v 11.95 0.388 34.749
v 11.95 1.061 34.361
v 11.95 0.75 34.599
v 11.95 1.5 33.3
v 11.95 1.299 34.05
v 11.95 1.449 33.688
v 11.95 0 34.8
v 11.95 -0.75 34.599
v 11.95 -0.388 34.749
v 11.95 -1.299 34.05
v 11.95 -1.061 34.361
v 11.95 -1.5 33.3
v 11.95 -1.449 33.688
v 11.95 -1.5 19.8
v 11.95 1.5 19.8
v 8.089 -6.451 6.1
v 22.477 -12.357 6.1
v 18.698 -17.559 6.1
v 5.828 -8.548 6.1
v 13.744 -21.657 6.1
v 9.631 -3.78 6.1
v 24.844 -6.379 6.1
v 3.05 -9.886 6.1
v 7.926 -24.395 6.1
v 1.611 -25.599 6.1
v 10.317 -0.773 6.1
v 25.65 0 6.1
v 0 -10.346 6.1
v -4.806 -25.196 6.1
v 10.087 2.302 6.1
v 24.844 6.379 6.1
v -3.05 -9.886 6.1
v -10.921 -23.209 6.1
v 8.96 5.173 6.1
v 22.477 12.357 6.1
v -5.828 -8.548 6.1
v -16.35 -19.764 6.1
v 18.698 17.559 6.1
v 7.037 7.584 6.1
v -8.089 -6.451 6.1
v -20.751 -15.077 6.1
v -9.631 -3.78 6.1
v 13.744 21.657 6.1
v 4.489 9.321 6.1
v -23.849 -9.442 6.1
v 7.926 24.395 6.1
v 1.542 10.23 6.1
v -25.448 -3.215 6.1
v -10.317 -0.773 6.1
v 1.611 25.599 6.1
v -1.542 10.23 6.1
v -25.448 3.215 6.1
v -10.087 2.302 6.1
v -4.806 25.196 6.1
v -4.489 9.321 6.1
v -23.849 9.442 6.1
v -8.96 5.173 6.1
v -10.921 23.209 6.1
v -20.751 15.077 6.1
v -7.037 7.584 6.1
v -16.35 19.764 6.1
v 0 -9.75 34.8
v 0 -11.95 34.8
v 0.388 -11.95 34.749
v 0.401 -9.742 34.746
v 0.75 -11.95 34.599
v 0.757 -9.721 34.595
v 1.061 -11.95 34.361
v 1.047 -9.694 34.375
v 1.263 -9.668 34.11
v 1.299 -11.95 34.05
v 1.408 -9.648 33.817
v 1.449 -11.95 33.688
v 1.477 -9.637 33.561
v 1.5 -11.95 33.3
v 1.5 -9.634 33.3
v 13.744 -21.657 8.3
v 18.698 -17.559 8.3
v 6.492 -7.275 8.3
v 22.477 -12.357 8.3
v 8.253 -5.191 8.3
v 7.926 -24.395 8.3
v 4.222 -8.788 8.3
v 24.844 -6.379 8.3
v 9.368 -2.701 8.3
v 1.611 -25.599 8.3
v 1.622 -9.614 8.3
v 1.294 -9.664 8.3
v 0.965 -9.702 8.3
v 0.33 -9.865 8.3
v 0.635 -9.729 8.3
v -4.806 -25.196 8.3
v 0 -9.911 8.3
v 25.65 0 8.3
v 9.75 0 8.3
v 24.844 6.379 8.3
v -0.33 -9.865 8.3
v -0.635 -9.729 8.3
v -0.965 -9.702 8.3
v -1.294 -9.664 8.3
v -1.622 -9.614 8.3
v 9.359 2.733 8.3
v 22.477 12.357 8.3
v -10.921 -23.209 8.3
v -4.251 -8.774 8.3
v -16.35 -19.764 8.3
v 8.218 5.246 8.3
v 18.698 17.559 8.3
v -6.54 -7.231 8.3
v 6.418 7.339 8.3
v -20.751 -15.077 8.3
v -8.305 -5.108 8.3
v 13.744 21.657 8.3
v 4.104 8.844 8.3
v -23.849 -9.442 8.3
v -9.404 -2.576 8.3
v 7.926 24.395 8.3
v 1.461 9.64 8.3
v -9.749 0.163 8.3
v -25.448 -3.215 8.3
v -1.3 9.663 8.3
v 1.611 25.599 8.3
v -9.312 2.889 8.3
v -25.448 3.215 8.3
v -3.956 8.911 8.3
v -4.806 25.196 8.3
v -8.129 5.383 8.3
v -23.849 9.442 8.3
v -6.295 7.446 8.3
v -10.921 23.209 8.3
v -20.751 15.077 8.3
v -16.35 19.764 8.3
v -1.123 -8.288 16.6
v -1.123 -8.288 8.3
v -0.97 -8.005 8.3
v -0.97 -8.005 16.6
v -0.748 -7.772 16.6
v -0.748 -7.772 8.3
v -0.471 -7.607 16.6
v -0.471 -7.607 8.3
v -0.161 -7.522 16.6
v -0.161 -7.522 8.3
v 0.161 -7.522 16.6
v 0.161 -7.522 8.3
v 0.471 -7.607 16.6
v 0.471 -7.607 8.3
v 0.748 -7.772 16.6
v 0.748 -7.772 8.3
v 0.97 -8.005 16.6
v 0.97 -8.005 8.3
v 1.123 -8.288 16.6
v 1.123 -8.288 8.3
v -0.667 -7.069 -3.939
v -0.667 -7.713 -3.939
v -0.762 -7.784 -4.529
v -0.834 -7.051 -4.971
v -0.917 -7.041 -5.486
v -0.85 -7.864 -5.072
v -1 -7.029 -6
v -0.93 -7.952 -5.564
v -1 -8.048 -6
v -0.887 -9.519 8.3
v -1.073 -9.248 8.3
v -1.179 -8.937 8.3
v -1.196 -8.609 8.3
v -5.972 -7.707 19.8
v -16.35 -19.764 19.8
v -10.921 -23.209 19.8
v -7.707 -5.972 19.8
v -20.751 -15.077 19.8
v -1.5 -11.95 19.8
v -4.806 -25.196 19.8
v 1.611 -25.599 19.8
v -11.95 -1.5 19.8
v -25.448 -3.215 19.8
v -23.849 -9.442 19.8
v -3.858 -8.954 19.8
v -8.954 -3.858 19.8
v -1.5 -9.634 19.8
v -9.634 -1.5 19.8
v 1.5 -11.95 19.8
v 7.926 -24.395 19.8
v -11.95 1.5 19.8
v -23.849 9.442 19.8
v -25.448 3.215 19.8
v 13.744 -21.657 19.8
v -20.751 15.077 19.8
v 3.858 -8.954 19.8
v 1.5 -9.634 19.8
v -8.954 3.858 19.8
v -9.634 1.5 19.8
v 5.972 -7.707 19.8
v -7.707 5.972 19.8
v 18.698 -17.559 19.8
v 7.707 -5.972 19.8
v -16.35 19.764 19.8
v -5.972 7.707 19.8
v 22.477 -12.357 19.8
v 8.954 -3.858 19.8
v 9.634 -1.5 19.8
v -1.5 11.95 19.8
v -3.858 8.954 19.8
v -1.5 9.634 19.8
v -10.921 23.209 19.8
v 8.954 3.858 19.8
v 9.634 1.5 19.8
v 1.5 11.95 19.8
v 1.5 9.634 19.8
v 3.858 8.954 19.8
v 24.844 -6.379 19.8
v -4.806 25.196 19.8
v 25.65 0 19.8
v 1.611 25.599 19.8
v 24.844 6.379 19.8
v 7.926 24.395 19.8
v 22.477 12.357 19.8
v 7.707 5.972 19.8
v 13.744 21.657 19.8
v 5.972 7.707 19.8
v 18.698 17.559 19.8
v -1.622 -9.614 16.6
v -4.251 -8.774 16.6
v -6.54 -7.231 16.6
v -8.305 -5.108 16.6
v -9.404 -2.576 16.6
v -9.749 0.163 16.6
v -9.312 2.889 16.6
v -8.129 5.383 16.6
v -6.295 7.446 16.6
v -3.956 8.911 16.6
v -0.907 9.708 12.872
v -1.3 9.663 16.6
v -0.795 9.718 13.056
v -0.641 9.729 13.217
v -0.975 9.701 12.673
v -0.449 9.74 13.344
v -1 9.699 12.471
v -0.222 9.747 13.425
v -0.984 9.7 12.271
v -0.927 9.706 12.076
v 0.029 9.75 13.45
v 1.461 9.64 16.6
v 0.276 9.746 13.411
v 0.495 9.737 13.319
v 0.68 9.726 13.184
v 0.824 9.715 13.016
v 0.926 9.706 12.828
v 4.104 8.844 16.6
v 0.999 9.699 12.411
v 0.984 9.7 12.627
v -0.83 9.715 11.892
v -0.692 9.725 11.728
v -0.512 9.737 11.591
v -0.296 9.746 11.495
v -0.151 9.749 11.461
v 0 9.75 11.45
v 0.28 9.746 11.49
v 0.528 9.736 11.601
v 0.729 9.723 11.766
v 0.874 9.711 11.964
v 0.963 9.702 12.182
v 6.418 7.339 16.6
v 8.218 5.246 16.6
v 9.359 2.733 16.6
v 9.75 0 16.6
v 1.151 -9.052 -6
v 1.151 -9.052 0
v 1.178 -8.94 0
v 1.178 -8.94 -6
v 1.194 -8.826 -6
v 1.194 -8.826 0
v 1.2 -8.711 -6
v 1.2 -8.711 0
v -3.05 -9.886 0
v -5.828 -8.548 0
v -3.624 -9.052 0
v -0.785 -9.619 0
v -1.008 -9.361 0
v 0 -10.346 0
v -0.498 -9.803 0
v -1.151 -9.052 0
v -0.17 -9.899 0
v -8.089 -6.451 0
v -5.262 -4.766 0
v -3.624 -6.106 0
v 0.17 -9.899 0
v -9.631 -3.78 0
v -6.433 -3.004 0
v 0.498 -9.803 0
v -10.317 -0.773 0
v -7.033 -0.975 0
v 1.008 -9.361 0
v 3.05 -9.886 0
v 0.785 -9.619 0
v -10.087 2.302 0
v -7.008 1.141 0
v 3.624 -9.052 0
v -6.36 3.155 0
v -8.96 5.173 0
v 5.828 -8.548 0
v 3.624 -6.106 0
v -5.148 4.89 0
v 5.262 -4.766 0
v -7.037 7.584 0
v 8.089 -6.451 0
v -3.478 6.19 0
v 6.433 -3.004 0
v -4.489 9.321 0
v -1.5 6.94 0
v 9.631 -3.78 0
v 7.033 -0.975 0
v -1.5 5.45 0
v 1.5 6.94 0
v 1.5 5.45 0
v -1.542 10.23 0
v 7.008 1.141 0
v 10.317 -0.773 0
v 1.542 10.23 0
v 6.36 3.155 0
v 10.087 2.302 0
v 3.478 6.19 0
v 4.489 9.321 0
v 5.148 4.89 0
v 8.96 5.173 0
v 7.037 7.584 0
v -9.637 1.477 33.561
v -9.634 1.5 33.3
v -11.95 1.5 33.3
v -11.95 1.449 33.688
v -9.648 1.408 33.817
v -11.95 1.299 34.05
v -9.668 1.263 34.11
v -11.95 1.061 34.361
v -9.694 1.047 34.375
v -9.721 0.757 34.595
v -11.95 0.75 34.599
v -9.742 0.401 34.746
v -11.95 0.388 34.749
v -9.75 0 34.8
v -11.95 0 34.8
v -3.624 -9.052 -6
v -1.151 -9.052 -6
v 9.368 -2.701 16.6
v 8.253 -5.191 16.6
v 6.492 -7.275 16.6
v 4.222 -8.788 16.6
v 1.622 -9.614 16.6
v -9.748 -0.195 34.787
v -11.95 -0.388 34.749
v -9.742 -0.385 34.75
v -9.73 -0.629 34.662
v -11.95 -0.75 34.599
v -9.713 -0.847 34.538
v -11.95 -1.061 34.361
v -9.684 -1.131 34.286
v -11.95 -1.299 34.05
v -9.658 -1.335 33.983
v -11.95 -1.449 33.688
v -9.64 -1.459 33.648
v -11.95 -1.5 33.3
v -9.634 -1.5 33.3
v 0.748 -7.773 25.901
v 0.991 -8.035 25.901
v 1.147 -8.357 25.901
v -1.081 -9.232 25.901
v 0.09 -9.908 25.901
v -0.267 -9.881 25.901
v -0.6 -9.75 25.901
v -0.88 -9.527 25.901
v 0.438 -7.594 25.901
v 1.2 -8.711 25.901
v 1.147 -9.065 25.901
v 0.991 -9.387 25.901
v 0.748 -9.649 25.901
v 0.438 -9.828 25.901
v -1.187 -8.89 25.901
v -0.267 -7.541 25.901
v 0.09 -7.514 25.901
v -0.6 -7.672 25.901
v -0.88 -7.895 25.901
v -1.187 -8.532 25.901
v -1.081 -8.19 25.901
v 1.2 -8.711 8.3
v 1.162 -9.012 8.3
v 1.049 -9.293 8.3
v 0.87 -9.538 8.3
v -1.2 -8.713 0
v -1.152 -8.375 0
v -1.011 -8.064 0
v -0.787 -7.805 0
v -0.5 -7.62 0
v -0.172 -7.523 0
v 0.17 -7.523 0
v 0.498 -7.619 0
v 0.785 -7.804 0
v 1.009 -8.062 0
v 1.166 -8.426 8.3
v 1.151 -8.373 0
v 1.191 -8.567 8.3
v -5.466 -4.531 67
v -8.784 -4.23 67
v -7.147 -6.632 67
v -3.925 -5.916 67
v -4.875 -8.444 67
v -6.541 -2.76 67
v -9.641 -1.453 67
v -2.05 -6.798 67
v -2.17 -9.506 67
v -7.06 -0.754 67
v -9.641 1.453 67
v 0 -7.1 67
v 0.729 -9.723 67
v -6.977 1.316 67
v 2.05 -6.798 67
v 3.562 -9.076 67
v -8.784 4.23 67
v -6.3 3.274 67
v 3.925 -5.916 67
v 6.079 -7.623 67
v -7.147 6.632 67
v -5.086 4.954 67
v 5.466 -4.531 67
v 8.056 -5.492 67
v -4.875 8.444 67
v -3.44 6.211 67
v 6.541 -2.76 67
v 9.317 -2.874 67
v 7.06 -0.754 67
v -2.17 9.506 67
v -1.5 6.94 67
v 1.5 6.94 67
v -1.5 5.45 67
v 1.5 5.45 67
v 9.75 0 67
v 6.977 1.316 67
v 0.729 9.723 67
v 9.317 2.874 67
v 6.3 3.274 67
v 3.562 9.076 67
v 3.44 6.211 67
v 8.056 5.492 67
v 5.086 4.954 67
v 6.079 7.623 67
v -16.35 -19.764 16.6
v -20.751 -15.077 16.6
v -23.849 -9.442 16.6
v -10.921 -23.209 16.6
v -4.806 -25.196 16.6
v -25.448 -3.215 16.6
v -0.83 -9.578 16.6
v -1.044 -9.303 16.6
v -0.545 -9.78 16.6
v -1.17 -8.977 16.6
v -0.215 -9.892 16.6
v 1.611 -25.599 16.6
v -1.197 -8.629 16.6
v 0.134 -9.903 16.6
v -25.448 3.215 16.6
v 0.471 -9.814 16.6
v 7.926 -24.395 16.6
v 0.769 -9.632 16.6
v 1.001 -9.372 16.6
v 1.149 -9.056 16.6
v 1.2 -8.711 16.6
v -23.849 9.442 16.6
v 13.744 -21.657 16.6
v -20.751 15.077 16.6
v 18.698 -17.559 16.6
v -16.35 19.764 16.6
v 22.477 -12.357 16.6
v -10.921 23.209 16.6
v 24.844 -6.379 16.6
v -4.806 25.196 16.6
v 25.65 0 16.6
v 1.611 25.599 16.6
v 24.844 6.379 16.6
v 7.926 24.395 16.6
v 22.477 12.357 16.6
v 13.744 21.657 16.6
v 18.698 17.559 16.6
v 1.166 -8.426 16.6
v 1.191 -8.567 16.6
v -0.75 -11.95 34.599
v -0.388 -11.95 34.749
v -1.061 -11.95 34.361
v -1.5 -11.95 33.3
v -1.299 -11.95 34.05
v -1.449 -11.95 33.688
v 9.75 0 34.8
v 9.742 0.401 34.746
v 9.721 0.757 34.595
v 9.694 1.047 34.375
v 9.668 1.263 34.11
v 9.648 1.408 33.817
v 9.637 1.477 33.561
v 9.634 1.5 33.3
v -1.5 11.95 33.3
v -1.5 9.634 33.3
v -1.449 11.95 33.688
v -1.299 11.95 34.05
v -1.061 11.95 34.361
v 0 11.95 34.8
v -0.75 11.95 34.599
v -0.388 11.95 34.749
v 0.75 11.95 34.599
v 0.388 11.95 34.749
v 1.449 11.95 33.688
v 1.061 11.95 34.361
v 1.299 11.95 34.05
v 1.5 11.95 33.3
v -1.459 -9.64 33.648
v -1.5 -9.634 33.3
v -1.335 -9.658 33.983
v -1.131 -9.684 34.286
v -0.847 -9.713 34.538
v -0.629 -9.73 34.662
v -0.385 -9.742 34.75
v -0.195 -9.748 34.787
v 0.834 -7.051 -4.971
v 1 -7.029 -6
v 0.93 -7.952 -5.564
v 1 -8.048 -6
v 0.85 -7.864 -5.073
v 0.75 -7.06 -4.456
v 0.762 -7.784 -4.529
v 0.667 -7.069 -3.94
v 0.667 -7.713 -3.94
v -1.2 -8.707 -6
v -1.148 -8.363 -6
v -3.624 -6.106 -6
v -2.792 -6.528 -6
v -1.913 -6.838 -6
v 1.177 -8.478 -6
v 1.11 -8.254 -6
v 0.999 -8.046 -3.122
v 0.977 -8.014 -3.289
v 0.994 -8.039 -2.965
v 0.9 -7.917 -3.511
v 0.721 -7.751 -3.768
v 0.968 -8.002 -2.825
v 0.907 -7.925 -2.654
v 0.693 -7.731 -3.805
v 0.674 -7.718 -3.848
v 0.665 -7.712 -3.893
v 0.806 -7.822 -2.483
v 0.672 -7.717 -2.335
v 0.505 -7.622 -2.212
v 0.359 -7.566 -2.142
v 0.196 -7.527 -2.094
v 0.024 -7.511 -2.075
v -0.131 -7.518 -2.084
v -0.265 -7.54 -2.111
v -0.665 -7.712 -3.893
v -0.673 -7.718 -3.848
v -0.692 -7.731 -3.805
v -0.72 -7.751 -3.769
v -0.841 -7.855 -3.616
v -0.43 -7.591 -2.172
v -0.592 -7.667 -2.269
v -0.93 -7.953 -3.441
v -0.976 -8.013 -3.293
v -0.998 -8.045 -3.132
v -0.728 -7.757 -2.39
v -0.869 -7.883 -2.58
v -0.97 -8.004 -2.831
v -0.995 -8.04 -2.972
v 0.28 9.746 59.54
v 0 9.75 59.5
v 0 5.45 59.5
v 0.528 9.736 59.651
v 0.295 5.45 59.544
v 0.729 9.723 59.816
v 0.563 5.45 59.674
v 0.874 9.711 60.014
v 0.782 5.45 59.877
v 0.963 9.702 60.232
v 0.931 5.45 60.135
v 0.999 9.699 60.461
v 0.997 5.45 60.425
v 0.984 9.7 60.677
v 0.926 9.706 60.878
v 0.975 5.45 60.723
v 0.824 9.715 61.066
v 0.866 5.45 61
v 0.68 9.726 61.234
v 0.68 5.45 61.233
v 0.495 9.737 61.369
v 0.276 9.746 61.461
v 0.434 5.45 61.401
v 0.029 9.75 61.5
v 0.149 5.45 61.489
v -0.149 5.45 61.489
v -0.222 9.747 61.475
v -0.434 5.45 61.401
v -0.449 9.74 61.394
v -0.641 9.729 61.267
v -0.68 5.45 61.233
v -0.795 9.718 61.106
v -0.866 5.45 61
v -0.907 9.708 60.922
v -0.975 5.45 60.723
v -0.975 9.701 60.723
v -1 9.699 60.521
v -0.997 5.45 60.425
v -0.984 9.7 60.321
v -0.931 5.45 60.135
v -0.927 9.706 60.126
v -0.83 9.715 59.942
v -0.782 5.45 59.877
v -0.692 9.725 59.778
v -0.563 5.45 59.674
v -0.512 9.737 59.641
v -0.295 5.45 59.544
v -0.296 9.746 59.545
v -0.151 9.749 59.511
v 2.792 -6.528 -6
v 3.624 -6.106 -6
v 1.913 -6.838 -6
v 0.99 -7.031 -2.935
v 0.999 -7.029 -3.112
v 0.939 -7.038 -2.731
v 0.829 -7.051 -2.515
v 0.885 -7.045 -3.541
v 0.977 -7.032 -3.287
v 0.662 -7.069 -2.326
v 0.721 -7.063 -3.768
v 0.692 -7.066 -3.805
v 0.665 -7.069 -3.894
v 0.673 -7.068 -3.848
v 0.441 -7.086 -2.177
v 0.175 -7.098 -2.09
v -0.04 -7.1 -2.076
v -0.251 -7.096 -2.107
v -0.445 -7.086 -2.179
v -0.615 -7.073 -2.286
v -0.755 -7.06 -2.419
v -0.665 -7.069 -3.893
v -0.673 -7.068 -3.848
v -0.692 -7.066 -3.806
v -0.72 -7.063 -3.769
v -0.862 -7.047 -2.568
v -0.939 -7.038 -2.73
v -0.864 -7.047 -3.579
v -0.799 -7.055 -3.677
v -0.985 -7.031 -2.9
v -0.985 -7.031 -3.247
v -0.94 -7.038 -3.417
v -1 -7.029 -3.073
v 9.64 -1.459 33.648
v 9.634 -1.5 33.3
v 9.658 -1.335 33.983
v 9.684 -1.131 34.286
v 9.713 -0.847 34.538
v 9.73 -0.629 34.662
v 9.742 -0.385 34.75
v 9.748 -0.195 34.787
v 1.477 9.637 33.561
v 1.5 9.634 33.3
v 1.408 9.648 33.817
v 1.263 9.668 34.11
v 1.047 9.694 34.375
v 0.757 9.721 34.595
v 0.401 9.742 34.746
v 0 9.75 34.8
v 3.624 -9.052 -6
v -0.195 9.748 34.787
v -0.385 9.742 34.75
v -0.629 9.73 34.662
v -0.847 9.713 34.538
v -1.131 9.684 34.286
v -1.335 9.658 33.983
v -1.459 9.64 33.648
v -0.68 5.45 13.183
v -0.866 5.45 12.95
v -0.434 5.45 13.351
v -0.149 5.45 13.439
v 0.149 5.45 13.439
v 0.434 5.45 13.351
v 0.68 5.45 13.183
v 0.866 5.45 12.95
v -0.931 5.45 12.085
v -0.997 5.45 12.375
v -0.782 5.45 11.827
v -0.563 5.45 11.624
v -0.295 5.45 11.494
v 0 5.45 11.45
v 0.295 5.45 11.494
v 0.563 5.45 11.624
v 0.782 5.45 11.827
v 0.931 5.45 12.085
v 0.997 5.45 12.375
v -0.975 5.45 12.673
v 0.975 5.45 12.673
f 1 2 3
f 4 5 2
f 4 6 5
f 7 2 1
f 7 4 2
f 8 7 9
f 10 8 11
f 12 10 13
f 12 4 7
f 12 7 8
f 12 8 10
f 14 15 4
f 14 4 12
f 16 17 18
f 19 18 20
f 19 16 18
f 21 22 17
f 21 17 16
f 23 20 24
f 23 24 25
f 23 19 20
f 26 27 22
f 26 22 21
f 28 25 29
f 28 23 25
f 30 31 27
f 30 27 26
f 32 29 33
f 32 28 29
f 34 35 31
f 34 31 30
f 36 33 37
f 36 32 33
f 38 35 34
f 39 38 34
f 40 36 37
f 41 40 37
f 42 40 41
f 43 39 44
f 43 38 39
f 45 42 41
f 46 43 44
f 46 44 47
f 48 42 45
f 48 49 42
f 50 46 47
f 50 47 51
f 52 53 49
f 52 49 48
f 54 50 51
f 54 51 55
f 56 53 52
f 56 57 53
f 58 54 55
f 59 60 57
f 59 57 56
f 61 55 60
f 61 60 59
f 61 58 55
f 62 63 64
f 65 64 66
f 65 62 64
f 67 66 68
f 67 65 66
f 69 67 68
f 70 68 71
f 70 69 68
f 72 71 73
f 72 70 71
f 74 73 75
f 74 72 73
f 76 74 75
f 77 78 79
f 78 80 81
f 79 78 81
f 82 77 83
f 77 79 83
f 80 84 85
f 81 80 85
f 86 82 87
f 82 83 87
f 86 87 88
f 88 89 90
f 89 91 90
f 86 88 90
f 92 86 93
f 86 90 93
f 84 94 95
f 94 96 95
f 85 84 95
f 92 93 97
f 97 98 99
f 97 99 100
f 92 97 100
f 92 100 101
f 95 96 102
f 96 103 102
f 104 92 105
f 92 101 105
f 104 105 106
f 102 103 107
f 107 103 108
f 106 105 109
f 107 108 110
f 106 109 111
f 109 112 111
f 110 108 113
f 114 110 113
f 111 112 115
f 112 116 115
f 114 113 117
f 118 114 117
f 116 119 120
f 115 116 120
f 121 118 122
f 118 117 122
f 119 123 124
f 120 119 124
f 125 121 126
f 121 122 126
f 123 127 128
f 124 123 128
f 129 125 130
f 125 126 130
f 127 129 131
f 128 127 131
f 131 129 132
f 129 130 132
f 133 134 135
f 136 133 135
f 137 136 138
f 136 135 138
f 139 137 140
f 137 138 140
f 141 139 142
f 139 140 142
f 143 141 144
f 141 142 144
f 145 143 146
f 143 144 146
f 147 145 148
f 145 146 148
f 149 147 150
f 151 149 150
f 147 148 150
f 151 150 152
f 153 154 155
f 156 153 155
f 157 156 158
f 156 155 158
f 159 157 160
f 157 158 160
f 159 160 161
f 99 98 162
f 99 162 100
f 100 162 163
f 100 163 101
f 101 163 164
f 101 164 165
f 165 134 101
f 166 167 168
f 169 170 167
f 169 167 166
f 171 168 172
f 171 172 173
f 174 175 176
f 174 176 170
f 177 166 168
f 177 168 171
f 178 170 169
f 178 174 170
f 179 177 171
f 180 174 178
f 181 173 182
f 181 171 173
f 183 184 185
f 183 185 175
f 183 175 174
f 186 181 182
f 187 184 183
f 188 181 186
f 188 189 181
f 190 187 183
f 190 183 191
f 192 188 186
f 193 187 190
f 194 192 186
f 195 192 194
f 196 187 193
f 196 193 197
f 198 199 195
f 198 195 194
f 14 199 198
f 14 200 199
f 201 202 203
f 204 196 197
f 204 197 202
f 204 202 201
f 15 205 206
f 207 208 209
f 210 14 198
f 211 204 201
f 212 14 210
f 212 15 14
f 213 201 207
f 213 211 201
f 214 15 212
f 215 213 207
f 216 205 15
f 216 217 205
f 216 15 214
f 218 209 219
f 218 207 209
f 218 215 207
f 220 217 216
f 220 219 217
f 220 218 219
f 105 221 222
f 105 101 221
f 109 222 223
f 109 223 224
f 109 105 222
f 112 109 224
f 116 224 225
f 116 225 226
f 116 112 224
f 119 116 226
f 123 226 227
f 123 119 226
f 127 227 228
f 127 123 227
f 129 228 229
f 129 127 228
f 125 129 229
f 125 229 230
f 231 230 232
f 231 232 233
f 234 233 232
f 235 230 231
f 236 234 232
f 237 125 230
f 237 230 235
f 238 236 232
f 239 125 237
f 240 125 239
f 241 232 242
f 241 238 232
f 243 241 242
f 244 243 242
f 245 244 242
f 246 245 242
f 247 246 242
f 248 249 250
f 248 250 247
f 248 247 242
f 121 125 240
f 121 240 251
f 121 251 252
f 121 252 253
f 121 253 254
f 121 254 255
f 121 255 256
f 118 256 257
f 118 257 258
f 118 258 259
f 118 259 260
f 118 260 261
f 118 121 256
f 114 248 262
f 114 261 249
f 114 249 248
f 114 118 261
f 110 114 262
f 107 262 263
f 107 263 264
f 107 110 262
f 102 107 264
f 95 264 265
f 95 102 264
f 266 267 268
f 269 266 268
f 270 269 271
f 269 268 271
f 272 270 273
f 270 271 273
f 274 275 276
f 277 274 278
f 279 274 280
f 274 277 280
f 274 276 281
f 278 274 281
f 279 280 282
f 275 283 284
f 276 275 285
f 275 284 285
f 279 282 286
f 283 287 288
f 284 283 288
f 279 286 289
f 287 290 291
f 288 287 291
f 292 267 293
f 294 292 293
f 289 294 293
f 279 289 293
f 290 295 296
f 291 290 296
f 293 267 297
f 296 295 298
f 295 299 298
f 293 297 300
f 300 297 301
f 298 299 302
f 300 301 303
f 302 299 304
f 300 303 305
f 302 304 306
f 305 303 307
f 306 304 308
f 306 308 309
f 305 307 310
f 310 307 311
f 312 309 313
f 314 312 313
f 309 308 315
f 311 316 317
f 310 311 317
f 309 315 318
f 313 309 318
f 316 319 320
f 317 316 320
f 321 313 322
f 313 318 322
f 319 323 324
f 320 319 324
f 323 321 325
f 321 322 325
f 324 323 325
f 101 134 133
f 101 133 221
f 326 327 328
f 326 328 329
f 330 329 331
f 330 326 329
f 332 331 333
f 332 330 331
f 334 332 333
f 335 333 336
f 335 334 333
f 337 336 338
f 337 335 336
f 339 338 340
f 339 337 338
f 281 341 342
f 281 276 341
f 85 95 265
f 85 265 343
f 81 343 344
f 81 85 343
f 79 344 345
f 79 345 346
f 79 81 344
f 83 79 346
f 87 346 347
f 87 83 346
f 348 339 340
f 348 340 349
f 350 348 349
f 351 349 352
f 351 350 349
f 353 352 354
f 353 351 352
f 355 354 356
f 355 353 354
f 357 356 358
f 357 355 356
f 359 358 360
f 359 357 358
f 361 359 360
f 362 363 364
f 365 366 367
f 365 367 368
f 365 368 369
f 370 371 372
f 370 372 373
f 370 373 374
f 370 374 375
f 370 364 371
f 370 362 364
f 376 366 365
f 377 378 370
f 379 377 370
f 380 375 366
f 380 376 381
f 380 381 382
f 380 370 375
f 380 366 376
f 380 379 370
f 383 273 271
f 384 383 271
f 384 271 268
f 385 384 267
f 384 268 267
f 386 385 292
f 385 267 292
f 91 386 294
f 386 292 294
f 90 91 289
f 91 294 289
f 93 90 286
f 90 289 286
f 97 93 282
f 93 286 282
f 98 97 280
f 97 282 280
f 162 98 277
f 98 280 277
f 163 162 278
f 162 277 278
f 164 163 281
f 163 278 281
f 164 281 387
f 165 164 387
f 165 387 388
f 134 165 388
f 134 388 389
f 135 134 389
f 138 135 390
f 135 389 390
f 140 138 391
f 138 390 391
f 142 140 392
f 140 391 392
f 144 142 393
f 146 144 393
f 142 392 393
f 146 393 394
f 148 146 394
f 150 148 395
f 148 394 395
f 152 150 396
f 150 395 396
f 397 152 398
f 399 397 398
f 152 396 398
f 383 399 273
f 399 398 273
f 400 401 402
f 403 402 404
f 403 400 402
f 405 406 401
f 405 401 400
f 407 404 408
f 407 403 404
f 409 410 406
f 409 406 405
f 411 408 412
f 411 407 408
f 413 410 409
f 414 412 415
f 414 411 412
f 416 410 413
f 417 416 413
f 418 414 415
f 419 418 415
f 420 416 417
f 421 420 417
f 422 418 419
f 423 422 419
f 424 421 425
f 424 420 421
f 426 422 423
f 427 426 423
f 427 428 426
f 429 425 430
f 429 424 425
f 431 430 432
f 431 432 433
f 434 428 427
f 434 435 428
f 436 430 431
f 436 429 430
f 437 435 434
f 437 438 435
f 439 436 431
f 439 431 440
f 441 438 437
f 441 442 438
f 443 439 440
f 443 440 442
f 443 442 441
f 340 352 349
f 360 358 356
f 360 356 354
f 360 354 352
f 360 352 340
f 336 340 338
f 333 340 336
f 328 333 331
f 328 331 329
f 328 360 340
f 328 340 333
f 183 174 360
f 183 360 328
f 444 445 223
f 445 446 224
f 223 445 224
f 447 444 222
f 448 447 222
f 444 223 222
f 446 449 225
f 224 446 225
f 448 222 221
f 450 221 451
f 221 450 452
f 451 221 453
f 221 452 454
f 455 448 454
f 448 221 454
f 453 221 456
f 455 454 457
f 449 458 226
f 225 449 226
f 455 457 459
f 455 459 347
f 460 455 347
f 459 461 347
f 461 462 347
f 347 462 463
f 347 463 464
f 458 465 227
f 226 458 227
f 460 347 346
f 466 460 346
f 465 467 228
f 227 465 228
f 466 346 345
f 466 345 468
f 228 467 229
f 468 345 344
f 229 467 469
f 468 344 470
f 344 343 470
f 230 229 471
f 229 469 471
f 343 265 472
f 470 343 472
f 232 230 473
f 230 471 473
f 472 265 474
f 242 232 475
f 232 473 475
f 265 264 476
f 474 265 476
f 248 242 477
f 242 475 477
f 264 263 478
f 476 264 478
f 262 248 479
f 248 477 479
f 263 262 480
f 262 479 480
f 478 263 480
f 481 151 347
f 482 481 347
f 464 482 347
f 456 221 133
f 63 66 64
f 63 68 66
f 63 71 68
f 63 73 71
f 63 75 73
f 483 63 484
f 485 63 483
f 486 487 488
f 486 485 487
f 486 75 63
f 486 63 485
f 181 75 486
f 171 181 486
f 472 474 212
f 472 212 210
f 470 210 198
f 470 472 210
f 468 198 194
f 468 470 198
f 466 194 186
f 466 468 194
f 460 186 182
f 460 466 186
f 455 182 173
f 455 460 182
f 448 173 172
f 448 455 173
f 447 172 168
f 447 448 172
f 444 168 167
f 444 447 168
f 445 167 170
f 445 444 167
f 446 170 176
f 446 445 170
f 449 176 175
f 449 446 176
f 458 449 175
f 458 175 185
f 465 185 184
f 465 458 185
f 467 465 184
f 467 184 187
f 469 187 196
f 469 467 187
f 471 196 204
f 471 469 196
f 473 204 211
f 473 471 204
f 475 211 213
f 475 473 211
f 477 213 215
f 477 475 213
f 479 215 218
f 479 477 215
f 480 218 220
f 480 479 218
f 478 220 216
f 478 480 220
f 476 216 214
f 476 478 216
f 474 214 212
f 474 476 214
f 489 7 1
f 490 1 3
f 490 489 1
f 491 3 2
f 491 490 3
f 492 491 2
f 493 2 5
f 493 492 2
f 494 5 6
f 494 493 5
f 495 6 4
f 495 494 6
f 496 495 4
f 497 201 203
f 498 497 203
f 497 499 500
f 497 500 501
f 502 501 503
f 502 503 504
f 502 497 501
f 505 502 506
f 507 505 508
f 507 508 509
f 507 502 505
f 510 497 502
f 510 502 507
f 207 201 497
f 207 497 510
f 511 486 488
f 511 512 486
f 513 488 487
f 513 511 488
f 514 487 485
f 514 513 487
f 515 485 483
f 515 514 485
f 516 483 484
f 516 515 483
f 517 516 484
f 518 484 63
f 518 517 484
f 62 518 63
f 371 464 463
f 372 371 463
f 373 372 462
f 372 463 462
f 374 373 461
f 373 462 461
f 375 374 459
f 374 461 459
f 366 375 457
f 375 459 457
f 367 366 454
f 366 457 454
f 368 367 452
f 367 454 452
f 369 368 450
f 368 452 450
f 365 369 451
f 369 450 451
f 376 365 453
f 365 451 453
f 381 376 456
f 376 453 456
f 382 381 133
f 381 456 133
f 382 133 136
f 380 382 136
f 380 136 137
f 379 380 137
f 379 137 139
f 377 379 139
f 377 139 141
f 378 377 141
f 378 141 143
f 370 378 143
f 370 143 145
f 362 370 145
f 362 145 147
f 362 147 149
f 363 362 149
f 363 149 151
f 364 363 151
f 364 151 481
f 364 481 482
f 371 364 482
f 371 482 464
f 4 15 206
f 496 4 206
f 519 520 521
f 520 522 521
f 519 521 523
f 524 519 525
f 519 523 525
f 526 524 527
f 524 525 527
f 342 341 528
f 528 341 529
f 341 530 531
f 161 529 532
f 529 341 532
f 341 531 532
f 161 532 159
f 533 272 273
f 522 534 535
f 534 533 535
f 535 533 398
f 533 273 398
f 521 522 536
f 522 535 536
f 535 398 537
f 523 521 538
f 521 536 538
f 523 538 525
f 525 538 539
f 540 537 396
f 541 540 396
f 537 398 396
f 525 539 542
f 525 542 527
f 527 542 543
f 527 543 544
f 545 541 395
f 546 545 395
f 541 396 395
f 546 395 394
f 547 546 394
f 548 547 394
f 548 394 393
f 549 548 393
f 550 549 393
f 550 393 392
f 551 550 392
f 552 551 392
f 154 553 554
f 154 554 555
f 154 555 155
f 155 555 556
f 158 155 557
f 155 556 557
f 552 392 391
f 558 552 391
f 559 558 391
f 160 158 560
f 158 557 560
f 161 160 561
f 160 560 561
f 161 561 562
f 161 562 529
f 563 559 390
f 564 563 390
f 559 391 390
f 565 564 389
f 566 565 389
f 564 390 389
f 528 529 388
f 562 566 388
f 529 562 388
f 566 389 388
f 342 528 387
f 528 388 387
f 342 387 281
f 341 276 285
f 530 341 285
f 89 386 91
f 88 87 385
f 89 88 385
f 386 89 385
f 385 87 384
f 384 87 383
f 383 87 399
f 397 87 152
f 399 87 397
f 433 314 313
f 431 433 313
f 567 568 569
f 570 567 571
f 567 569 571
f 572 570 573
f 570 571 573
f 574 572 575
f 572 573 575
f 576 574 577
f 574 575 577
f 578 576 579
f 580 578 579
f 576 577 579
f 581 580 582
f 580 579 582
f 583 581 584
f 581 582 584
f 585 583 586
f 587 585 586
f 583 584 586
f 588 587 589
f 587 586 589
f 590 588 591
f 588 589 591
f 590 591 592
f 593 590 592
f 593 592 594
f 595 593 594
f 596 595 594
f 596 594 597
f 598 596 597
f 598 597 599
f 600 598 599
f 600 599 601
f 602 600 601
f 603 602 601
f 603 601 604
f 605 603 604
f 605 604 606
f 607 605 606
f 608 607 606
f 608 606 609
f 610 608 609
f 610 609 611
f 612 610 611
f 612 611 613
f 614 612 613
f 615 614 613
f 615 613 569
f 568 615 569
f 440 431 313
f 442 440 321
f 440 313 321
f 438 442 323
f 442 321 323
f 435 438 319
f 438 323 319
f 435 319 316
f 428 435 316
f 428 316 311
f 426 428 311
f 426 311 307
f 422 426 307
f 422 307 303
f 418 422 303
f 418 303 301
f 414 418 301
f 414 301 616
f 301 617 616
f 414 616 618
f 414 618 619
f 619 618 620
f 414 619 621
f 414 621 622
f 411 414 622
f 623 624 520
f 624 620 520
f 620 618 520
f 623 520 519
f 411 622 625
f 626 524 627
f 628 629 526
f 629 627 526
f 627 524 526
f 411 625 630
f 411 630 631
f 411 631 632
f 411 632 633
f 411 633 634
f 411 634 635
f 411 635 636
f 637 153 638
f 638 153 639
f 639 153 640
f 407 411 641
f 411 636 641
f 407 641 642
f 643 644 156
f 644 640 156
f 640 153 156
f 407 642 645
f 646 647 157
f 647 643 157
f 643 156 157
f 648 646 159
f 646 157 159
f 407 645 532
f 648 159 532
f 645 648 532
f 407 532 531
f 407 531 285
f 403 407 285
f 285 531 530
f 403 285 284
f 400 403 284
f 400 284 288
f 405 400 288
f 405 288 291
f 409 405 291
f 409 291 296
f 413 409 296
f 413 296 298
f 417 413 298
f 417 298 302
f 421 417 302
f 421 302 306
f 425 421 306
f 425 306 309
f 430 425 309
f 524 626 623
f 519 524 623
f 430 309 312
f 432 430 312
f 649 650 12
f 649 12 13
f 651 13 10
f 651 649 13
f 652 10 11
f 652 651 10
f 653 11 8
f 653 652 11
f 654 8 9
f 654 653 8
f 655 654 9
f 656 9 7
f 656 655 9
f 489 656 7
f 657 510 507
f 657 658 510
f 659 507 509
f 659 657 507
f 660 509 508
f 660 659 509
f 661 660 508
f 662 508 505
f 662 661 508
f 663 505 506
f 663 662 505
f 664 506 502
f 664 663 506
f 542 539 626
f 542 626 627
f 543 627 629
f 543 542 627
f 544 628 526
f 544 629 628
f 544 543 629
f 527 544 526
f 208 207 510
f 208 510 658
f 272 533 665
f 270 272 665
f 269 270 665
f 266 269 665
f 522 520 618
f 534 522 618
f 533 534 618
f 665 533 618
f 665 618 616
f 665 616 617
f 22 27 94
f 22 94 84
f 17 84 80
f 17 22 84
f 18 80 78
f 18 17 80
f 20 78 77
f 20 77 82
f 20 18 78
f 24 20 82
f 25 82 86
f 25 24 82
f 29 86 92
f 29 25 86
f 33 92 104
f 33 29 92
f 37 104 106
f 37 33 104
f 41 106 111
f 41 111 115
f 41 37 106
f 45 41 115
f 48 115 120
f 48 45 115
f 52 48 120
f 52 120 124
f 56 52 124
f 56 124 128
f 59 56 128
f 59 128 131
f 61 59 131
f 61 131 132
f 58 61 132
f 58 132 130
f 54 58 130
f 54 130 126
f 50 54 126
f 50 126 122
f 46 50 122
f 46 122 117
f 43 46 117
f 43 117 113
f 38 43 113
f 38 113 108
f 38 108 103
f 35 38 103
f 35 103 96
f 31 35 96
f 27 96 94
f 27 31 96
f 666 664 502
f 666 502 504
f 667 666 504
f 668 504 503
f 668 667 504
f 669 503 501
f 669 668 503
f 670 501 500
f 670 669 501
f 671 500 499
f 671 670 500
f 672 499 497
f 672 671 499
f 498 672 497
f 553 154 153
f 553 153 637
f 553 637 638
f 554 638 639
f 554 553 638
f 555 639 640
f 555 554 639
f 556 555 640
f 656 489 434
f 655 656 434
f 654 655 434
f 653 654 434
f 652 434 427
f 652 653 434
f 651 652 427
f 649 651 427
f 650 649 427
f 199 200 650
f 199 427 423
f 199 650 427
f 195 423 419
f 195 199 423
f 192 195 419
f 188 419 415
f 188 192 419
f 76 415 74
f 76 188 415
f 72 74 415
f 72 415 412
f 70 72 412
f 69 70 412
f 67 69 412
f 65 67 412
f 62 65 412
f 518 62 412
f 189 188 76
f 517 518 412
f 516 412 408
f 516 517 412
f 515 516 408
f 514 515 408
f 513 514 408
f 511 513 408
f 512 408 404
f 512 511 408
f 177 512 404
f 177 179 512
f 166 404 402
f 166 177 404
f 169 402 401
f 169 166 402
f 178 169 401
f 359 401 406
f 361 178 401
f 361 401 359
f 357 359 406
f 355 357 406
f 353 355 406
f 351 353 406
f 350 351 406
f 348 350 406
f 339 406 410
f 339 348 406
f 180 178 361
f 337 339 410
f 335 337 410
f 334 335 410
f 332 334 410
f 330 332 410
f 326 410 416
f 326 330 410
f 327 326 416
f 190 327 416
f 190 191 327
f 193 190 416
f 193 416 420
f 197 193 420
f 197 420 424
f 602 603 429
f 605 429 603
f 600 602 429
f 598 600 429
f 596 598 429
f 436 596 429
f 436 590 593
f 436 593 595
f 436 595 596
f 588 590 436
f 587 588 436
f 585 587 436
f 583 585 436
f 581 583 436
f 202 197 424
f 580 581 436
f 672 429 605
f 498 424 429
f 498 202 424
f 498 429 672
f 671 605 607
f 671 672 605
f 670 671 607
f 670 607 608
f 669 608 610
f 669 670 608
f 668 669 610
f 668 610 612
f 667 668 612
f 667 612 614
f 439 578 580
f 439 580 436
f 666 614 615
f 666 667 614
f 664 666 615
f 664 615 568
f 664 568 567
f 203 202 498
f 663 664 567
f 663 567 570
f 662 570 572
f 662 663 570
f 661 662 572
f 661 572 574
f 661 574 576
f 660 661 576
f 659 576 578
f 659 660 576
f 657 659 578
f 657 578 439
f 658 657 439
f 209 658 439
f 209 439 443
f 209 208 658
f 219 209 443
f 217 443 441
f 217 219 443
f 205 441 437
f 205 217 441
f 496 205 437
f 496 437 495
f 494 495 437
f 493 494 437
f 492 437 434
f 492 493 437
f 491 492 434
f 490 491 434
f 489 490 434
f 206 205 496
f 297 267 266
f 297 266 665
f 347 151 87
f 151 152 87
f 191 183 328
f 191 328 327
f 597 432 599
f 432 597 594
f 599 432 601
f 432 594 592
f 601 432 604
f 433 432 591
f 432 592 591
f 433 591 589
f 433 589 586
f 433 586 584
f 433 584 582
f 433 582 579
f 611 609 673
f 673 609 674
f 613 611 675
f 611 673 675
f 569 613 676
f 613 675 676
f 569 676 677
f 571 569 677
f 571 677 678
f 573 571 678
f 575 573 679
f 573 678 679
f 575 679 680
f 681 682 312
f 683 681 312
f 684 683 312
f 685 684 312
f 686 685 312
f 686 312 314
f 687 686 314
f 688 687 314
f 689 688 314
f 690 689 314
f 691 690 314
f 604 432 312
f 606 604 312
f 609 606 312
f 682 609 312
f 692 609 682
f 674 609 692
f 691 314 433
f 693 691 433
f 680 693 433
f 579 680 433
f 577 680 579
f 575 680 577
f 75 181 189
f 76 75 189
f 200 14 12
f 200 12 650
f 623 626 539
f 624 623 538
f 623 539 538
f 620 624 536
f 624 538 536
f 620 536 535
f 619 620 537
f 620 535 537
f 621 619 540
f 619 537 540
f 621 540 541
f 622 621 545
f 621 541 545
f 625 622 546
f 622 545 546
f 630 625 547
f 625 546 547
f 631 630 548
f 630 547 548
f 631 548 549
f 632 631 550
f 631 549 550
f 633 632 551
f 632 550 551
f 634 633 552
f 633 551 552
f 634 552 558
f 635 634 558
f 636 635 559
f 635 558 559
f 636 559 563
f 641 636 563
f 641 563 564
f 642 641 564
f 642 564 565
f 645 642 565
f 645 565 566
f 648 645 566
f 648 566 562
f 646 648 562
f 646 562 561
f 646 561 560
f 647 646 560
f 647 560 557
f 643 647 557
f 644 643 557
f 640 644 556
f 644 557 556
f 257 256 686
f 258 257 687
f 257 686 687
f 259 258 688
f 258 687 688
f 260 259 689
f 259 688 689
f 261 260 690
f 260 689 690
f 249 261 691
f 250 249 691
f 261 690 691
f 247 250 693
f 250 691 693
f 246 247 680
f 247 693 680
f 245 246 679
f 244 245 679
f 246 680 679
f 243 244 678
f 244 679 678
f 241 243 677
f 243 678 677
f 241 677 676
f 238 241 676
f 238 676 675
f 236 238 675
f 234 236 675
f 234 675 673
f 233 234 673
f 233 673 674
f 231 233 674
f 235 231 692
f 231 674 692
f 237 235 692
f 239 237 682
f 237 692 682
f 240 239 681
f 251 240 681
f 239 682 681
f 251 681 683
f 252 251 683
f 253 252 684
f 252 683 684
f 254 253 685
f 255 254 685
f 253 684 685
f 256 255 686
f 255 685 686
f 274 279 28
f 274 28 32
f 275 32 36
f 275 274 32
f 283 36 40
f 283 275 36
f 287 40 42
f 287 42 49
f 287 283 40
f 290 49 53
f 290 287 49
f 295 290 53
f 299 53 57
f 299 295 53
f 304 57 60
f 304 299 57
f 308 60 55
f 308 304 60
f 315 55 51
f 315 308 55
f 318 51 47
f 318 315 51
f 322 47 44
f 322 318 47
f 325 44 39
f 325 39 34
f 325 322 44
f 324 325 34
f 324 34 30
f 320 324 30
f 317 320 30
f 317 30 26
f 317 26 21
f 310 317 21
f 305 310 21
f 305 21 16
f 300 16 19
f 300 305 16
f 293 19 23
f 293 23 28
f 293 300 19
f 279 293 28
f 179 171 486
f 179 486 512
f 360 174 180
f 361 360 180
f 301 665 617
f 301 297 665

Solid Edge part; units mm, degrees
sketch "Sketch1" plane through (0, 0, 0) normal (0, 0, 1) x (1, 0, 0)
  circle A0 centre (0, 0) radius 9.75
extrude "ProtrusioneEstrusa_1" add sketch "Sketch1" along normal blind 67
sketch "Sketch2" plane through (0, 0, 6.1) normal (0, 0, -1) x (1, 0, 0)
  circle A0 centre (0, 0) radius 25.65
extrude "ProtrusioneEstrusa_2" add sketch "Sketch2" against normal blind 2.2
sketch "Sketch3" plane through (0, 0, 16.6) normal (0, 0, 1) x (1, 0, 0)
  circle A0 centre (0, 0) radius 25.65
extrude "ProtrusioneEstrusa_3" add sketch "Sketch3" along normal blind 3.2
sketch "Sketch4" plane through (0, 0, 19.8) normal (0, 0, 1) x (1, 0, 0)
  line L0 (-11.95, -1.5) -> (-9.6339, -1.5)
  line L1 (-9.6339, -1.5) -> (-9.6339, 1.5)
  line L2 (-11.95, 1.5) -> (-9.6339, 1.5)
  line L3 (-11.95, 0) -> (-11.95, 1.5)
  line L4 (-11.95, 0) -> (-11.95, -1.5)
  line L5 (0, -11.95) -> (1.5, -11.95)
  line L6 (1.5, -11.95) -> (1.5, -9.6339)
  line L7 (1.5, -9.6339) -> (-1.5, -9.6339)
  line L8 (-1.5, -11.95) -> (-1.5, -9.6339)
  line L9 (0, -11.95) -> (-1.5, -11.95)
  line L10 (1.5, 11.95) -> (1.5, 9.6339)
  line L11 (-1.5, 9.6339) -> (1.5, 9.6339)
  line L12 (-1.5, 11.95) -> (-1.5, 9.6339)
  line L13 (0, 11.95) -> (-1.5, 11.95)
  line L14 (0, 11.95) -> (1.5, 11.95)
  line L15 (11.95, 0) -> (11.95, -1.5)
  line L16 (11.95, -1.5) -> (9.6339, -1.5)
  line L17 (9.6339, 1.5) -> (9.6339, -1.5)
  line L18 (11.95, 1.5) -> (9.6339, 1.5)
  line L19 (11.95, 0) -> (11.95, 1.5)
extrude "ProtrusioneEstrusa_4" add sketch "Sketch4" along normal blind 15
sketch "Sketch5" plane through (0, 5.45, 33.5) normal (0, -1, 0) x (0, 0, -1)
  circle A0 centre (21.05, 0) radius 1
  circle A1 centre (-27, 0) radius 1
extrude "ScavoEstrusione_3" cut sketch "Sketch5" against normal blind 12.2631 and the other way blind 0.5254
sketch "Sketch6" plane through (0, 0, 0) normal (0, 0, -1) x (1, 0, 0)
  line L0 (3.6239, 9.0515) -> (3.6239, 6.1055)
  arc A0 (-3.6239, 6.1055) -> (3.6239, 6.1055) centre (0, 0) cw
  line L1 (-3.6239, 9.0515) -> (-3.6239, 6.1055)
  line L2 (-3.6239, 9.0515) -> (3.6239, 9.0515)
extrude "ProtrusioneEstrusa_5" add sketch "Sketch6" along normal blind 6
sketch "Sketch7" plane through (0, 0.3492, 0) normal (0, 0, -1) x (0, -1, 0)
  circle A0 centre (0.3492, 0) radius 10.346
extrude "ProtrusioneEstrusa_6" add sketch "Sketch7" against normal blind 6.5682
sketch "Sketch8" plane through (0, 0, 0) normal (0, 0, 1) x (1, 0, 0)
  line L0 (-1.5, 6.9397) -> (-1.5, 5.45)
  line L1 (-1.5, 5.45) -> (1.5, 5.45)
  line L2 (1.5, 5.45) -> (1.5, 6.9397)
  arc A0 (1.5, 6.9397) -> (-1.5, 6.9397) centre (0, 0) cw
extrude "ScavoEstrusione_1" cut sketch "Sketch8" along normal mid plane 447.4642
fillet "Rotondo_1" radius 1.5 1 edges at (-1.5, -10.792, 34.8)
fillet "Rotondo_2" radius 1.5 1 edges at (1.5, -10.792, 34.8)
fillet "Rotondo_3" radius 1.5 3 edges at (-10.792, -1.5, 34.8) (-1.5, 10.792, 34.8) (10.792, 1.5, 34.8)
fillet "Rotondo_4" radius 1.5 3 edges at (-10.792, 1.5, 34.8) (1.5, 10.792, 34.8) (10.792, -1.5, 34.8)
sketch "Sketch9" plane through (0, 0, 0) normal (0, 0, -1) x (1, 0, 0)
  circle A0 centre (0, 8.7109) radius 1.2
extrude "ScavoEstrusione_5" cut sketch "Sketch9" along normal up to vertex (6 mm away) and the other way blind 25.9007
sketch "Sketch10" plane through (0, 0, 8.3) normal (0, 0, 1) x (-1, 0, 0)
  arc A0 (-1.6217, 9.6142) -> (1.6217, 9.6142) centre (0, 0) cw
  line L0 (1.1232, 8.2885) -> (1.6217, 9.6142)
  line L1 (-1.1232, 8.2885) -> (-1.6217, 9.6142)
  arc A1 (1.1232, 8.2885) -> (-1.1232, 8.2885) centre (0, 8.7109) cw
extrude "Cutout1" cut sketch "Sketch10" along normal up to vertex (8.3 mm away)
sketch "Sketch11" plane through (-2.3873, -9.0515, -3) normal (0, -1, 0) x (0, 0, 1)
  line L0 (-3, -3.3873) -> (-3, -1.3873)
  line L1 (-0.9394, -1.7204) -> (-3, -1.3873)
  arc A0 (-0.9394, -1.7204) -> (-0.7687, -1.667) centre (-0.9074, -1.523) ccw
  arc A1 (-0.94, -3.0543) -> (-0.7683, -3.1079) centre (-0.9078, -3.2529) cw
  line L2 (-3, -3.3873) -> (-0.94, -3.0543)
  arc A2 (-0.7687, -1.667) -> (-0.7683, -3.1079) centre (-0.075, -2.3873) cw
extrude "ScavoEstrusione_7" cut sketch "Sketch11" against normal blind 3.9764
